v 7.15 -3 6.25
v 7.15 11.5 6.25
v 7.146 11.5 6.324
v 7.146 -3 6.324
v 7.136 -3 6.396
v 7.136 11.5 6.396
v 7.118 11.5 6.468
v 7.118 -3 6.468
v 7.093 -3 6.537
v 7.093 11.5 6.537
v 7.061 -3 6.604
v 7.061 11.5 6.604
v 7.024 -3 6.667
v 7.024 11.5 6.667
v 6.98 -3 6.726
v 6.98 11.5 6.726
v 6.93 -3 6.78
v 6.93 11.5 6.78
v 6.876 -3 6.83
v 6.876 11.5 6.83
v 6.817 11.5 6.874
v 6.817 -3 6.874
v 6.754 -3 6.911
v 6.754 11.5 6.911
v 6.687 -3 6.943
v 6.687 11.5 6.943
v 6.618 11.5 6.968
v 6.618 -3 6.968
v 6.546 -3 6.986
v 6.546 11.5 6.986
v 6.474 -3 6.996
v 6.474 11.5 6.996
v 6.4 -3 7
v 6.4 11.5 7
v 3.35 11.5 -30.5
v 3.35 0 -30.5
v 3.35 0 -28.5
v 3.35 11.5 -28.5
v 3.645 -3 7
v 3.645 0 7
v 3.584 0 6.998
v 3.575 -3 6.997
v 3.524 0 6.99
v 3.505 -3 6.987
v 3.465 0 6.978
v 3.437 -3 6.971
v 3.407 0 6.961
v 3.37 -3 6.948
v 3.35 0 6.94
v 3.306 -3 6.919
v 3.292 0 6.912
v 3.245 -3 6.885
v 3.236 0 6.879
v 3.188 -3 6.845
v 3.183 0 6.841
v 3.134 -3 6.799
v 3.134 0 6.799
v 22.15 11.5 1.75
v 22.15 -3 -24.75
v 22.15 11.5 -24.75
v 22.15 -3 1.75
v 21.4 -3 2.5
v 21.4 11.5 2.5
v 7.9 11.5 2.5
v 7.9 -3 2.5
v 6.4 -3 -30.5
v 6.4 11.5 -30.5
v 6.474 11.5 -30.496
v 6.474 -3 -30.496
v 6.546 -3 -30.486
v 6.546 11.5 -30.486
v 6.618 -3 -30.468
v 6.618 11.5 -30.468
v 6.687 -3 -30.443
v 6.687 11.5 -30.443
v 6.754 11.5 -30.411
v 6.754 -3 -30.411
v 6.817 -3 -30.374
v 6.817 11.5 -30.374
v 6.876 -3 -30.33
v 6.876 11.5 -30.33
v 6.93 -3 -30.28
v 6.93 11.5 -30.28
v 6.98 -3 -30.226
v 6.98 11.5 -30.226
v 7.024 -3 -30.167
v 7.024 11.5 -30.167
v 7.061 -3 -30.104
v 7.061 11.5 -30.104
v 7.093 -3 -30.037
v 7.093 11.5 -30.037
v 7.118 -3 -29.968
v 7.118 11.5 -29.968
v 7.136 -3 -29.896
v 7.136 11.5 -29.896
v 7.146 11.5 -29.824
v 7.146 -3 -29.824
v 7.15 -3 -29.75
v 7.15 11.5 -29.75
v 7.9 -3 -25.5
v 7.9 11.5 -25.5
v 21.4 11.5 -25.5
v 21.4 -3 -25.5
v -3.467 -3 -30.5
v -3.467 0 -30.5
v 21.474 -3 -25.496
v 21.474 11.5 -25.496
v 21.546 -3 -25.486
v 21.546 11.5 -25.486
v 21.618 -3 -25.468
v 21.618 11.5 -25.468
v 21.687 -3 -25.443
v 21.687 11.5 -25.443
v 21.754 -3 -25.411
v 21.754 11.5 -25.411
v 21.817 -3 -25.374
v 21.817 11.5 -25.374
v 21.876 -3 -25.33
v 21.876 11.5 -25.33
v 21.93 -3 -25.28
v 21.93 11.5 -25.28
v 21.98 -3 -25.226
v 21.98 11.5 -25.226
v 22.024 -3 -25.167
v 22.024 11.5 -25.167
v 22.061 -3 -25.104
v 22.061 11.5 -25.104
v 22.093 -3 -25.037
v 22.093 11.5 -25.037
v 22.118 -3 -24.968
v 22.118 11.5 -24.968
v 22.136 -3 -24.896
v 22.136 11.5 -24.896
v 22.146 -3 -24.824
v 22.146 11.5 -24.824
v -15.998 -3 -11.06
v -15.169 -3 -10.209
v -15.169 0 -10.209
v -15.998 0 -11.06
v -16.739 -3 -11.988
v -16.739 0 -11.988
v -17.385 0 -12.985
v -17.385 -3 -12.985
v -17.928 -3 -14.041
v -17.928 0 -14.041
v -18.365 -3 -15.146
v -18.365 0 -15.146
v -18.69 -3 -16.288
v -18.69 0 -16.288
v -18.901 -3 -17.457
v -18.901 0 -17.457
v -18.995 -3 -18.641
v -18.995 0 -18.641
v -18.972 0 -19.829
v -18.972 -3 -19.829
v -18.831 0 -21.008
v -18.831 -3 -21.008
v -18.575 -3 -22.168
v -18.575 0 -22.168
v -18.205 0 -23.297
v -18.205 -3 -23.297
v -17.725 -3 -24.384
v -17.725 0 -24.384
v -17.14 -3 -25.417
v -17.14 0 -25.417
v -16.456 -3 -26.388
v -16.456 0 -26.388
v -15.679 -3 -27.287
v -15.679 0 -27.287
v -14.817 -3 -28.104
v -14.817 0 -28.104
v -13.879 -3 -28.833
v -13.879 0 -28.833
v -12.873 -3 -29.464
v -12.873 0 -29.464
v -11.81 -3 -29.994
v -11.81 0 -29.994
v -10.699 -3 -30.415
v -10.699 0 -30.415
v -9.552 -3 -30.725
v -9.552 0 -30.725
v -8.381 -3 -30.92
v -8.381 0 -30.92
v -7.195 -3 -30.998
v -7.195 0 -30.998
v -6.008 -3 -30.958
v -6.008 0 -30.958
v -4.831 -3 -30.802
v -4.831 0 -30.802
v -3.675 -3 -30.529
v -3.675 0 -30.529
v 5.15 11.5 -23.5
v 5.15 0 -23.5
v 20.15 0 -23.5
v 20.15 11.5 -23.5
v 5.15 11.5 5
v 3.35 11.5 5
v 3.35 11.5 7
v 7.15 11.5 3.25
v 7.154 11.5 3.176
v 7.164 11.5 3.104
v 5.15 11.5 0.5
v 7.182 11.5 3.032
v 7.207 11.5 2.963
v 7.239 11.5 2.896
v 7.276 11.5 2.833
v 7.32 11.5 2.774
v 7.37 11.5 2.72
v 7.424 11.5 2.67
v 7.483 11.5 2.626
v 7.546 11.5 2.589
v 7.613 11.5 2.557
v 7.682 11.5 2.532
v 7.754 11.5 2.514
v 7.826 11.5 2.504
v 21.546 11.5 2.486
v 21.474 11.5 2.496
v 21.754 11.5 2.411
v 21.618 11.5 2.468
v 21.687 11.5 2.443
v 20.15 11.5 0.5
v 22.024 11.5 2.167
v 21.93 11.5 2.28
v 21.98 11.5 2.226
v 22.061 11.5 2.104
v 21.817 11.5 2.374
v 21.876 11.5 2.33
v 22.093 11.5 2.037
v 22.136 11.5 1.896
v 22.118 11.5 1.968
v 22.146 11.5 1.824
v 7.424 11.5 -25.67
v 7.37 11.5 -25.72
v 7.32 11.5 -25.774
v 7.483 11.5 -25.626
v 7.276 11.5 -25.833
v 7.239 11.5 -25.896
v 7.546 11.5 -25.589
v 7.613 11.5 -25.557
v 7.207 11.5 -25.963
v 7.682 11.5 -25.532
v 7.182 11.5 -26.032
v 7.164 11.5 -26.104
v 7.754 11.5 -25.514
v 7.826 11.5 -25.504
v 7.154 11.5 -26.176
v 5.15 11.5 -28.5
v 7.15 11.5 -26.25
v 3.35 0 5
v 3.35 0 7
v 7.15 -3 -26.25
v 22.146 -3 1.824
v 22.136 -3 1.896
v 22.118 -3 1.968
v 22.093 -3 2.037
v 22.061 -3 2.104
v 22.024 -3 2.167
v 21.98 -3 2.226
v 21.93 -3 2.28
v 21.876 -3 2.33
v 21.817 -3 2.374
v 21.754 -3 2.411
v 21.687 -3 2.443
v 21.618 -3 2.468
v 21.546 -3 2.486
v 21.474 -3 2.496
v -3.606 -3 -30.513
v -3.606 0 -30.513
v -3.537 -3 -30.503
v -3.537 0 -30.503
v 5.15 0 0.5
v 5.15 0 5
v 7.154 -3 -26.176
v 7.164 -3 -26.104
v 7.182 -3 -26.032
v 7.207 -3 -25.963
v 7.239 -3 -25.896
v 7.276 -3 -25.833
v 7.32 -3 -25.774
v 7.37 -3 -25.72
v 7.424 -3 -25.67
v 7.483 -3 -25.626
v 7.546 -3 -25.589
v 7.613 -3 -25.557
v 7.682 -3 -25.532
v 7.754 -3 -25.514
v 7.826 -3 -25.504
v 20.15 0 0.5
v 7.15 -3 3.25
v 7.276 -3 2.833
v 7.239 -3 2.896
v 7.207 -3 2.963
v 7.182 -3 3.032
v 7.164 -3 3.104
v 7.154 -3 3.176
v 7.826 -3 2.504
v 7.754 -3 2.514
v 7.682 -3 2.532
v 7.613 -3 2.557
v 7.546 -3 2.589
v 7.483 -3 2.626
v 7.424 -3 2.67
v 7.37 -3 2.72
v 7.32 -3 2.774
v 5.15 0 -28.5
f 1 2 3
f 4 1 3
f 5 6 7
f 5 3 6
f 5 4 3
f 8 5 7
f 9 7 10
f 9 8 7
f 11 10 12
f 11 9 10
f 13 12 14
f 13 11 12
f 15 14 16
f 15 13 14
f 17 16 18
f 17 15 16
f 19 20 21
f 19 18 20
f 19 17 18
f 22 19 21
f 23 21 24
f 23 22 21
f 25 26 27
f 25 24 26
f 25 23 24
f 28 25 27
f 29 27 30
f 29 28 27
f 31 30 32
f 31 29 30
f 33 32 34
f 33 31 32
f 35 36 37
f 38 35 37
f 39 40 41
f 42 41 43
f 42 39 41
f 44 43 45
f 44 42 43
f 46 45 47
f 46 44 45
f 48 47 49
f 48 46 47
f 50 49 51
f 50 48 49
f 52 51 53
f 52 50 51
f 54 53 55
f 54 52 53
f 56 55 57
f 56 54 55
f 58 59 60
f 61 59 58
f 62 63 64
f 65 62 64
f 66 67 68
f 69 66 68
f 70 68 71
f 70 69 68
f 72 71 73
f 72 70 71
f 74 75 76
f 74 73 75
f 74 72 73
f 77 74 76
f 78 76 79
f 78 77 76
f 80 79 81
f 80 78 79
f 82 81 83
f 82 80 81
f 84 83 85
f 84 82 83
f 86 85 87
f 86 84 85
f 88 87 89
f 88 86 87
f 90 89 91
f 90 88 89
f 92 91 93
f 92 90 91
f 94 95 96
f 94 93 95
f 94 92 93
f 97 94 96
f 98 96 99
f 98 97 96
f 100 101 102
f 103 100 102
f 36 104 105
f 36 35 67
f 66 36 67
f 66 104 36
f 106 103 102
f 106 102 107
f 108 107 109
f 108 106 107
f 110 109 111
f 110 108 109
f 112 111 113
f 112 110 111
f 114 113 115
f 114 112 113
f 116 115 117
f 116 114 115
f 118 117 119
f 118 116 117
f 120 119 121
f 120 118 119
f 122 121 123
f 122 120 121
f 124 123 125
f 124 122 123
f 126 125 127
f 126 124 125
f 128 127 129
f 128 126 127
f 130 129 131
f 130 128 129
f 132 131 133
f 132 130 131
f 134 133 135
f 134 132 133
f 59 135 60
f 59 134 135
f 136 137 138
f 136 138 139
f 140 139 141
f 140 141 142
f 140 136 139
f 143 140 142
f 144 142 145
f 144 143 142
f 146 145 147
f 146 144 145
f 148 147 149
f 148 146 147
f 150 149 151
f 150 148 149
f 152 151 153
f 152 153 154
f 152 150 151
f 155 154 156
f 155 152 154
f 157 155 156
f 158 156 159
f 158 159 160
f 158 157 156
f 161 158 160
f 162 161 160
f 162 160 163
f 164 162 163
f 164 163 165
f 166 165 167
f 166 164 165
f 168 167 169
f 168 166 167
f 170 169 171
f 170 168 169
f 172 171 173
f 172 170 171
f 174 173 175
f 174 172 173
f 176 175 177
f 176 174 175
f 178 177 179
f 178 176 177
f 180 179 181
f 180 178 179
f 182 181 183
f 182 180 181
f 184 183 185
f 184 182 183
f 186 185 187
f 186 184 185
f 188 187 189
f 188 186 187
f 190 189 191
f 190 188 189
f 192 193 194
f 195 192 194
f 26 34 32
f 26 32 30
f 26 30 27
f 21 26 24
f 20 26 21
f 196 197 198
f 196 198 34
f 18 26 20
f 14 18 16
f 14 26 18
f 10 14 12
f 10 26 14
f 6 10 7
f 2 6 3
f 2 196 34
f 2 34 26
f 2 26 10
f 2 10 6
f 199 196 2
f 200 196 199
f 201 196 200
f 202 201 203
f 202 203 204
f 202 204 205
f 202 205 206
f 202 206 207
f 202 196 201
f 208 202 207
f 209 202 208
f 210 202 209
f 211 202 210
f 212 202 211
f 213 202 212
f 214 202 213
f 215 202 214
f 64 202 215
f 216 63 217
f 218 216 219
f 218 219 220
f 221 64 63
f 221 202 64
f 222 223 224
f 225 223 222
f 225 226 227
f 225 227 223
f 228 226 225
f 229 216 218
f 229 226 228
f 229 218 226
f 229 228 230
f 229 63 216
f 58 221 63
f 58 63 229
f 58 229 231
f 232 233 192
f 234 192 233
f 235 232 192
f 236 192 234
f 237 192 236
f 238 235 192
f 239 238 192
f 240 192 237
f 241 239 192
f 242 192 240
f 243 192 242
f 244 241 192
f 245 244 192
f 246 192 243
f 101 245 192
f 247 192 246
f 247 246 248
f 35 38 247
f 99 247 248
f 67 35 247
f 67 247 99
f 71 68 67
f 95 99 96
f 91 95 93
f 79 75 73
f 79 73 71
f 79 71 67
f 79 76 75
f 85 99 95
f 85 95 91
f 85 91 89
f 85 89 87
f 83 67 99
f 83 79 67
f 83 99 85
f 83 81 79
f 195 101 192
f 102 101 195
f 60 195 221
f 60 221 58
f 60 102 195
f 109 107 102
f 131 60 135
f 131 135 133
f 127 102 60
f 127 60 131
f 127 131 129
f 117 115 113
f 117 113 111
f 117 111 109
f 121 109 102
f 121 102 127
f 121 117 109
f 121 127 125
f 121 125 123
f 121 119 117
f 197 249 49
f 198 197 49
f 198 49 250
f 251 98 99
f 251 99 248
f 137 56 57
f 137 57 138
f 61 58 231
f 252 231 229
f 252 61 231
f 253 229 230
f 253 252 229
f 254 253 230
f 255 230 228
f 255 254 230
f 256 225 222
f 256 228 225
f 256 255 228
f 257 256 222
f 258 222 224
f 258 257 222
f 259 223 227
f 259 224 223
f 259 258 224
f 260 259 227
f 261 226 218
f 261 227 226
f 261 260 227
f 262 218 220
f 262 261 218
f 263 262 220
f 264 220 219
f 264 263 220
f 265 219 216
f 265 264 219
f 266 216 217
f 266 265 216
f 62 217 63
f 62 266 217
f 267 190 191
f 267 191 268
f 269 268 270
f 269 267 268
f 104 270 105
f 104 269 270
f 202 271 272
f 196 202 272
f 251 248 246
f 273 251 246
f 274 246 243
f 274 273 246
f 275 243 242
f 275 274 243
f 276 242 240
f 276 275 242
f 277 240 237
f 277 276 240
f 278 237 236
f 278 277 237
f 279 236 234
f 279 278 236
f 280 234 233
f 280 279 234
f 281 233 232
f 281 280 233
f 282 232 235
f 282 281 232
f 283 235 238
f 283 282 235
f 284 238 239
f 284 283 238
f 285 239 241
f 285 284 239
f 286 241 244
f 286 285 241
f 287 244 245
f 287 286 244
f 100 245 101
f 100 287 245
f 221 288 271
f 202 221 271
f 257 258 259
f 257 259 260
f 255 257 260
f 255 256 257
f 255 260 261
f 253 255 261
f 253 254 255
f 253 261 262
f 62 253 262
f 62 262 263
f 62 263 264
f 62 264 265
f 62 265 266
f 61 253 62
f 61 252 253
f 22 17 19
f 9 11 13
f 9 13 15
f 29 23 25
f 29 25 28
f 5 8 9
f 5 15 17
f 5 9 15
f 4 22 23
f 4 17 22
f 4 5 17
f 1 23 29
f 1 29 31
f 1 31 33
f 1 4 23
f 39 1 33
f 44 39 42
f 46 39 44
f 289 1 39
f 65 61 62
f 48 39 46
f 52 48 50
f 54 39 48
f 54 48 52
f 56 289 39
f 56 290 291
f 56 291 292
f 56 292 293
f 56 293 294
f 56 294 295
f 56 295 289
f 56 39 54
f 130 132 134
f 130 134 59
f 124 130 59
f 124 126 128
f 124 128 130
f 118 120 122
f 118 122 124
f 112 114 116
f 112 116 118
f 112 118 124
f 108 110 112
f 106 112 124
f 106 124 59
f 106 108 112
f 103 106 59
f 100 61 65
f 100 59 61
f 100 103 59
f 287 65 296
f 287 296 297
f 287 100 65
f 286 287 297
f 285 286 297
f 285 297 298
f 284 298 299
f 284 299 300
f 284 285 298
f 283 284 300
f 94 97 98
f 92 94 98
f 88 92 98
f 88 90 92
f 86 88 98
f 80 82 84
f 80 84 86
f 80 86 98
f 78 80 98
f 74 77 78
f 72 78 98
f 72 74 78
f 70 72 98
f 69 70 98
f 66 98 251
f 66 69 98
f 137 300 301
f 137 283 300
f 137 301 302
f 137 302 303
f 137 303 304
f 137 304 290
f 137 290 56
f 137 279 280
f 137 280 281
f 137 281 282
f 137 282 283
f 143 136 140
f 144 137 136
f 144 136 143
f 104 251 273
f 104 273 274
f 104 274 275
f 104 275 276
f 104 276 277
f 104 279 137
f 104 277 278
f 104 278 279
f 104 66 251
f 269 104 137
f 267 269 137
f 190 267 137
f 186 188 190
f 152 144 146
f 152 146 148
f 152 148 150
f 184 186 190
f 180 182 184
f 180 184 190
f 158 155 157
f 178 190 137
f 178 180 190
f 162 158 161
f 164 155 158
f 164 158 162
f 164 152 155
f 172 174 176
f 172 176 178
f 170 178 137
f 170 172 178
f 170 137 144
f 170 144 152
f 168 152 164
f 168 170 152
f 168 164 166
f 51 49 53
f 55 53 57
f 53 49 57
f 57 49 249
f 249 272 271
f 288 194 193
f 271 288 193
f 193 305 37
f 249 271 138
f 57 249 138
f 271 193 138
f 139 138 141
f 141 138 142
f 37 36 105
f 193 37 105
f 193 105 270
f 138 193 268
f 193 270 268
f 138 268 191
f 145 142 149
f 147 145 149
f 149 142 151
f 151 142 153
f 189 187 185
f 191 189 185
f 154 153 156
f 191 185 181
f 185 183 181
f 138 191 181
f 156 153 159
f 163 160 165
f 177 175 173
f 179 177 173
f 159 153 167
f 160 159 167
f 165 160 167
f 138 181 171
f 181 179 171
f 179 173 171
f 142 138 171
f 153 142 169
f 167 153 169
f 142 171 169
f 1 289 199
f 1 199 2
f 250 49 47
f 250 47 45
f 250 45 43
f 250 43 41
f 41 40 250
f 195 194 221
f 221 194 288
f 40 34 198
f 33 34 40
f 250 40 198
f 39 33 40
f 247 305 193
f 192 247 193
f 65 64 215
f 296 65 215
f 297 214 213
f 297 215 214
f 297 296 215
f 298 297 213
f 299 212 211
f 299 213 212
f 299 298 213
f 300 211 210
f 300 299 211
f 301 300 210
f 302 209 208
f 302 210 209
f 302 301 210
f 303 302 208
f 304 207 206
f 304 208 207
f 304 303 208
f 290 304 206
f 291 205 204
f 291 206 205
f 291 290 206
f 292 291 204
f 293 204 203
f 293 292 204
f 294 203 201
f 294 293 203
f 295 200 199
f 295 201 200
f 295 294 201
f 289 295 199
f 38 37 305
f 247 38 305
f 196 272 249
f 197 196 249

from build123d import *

# Parameters (mm, degrees)
BRACKET_DEPTH       = 11.5
BOSS_EXTRUDE1_START = -3
BOSS_EXTRUDE1_DEPTH = 3


with BuildPart() as part:
    # Sketch9 → Bracket (new body)
    with BuildSketch(Plane(origin=(0, 0, 0), x_dir=(1, 0, 0), z_dir=(0, 1, 0))):
        with BuildLine():
            Line((5.15, -5), (4.65, -5))
            Line((4.65, -5), (3.35, -5))
            Line((3.35, -5), (3.35, -7))
            Line((3.35, -7), (6.4, -7))
            ThreePointArc((6.4, -7), (6.930330086, -6.780330086), (7.15, -6.25))
            Line((7.15, -6.25), (7.15, -5))
            Line((7.15, -5), (7.15, -3.25))
            ThreePointArc((7.15, -3.25), (7.369669914, -2.719669914), (7.9, -2.5))
            Line((7.9, -2.5), (21.4, -2.5))
            ThreePointArc((21.4, -2.5), (21.930330086, -2.280330086), (22.15, -1.75))
            Line((22.15, -1.75), (22.15, 24.75))
            ThreePointArc((22.15, 24.75), (21.930330086, 25.280330086), (21.4, 25.5))
            Line((21.4, 25.5), (7.9, 25.5))
            ThreePointArc((7.9, 25.5), (7.369669914, 25.719669914), (7.15, 26.25))
            Line((7.15, 26.25), (7.15, 28))
            Line((7.15, 28), (7.15, 29.75))
            ThreePointArc((7.15, 29.75), (6.930330086, 30.280330086), (6.4, 30.5))
            Line((6.4, 30.5), (5.15, 30.5))
            Line((5.15, 30.5), (3.35, 30.5))
            Line((3.35, 30.5), (3.35, 28.5))
            Line((3.35, 28.5), (5.15, 28.5))
            Line((5.15, 28.5), (5.15, 28))
            Line((5.15, 28), (5.15, 23.5))
            Line((5.15, 23.5), (20.15, 23.5))
            Line((20.15, 23.5), (20.15, -0.5))
            Line((20.15, -0.5), (5.15, -0.5))
            Line((5.15, -0.5), (5.15, -5))
        make_face()
    extrude(amount=BRACKET_DEPTH)

    # Sketch12 → Boss-Extrude1 (add)
    with BuildSketch(Plane(origin=(0, 0, 0), x_dir=(1, 0, 0), z_dir=(0, 1, 0)).offset(BOSS_EXTRUDE1_START)):
        with BuildLine():
            Line((3.134136634, -6.799408153), (-15.169112008, 10.208954707))
            ThreePointArc((-15.169112008, 10.208954707), (-17.445237733, 24.907700028), (-3.6745965, 30.529381479))
            ThreePointArc((-3.6745965, 30.529381479), (-3.571695801, 30.507381696), (-3.466728879, 30.5))
            Line((-3.466728879, 30.5), (6.4, 30.5))
            ThreePointArc((6.4, 30.5), (6.930330086, 30.280330086), (7.15, 29.75))
            Line((7.15, 29.75), (7.15, 26.25))
            ThreePointArc((7.15, 26.25), (7.369669914, 25.719669914), (7.9, 25.5))
            Line((7.9, 25.5), (21.4, 25.5))
            ThreePointArc((21.4, 25.5), (21.930330086, 25.280330086), (22.15, 24.75))
            Line((22.15, 24.75), (22.15, -1.75))
            ThreePointArc((22.15, -1.75), (21.930330086, -2.280330086), (21.4, -2.5))
            Line((21.4, -2.5), (7.9, -2.5))
            ThreePointArc((7.9, -2.5), (7.369669914, -2.719669914), (7.15, -3.25))
            Line((7.15, -3.25), (7.15, -6.25))
            ThreePointArc((7.15, -6.25), (6.930330086, -6.780330086), (6.4, -7))
            Line((6.4, -7), (3.644676233, -7))
            ThreePointArc((3.644676233, -7), (3.370410043, -6.948053048), (3.134136634, -6.799408153))
        make_face()
    extrude(amount=BOSS_EXTRUDE1_DEPTH)


solid = part.part
